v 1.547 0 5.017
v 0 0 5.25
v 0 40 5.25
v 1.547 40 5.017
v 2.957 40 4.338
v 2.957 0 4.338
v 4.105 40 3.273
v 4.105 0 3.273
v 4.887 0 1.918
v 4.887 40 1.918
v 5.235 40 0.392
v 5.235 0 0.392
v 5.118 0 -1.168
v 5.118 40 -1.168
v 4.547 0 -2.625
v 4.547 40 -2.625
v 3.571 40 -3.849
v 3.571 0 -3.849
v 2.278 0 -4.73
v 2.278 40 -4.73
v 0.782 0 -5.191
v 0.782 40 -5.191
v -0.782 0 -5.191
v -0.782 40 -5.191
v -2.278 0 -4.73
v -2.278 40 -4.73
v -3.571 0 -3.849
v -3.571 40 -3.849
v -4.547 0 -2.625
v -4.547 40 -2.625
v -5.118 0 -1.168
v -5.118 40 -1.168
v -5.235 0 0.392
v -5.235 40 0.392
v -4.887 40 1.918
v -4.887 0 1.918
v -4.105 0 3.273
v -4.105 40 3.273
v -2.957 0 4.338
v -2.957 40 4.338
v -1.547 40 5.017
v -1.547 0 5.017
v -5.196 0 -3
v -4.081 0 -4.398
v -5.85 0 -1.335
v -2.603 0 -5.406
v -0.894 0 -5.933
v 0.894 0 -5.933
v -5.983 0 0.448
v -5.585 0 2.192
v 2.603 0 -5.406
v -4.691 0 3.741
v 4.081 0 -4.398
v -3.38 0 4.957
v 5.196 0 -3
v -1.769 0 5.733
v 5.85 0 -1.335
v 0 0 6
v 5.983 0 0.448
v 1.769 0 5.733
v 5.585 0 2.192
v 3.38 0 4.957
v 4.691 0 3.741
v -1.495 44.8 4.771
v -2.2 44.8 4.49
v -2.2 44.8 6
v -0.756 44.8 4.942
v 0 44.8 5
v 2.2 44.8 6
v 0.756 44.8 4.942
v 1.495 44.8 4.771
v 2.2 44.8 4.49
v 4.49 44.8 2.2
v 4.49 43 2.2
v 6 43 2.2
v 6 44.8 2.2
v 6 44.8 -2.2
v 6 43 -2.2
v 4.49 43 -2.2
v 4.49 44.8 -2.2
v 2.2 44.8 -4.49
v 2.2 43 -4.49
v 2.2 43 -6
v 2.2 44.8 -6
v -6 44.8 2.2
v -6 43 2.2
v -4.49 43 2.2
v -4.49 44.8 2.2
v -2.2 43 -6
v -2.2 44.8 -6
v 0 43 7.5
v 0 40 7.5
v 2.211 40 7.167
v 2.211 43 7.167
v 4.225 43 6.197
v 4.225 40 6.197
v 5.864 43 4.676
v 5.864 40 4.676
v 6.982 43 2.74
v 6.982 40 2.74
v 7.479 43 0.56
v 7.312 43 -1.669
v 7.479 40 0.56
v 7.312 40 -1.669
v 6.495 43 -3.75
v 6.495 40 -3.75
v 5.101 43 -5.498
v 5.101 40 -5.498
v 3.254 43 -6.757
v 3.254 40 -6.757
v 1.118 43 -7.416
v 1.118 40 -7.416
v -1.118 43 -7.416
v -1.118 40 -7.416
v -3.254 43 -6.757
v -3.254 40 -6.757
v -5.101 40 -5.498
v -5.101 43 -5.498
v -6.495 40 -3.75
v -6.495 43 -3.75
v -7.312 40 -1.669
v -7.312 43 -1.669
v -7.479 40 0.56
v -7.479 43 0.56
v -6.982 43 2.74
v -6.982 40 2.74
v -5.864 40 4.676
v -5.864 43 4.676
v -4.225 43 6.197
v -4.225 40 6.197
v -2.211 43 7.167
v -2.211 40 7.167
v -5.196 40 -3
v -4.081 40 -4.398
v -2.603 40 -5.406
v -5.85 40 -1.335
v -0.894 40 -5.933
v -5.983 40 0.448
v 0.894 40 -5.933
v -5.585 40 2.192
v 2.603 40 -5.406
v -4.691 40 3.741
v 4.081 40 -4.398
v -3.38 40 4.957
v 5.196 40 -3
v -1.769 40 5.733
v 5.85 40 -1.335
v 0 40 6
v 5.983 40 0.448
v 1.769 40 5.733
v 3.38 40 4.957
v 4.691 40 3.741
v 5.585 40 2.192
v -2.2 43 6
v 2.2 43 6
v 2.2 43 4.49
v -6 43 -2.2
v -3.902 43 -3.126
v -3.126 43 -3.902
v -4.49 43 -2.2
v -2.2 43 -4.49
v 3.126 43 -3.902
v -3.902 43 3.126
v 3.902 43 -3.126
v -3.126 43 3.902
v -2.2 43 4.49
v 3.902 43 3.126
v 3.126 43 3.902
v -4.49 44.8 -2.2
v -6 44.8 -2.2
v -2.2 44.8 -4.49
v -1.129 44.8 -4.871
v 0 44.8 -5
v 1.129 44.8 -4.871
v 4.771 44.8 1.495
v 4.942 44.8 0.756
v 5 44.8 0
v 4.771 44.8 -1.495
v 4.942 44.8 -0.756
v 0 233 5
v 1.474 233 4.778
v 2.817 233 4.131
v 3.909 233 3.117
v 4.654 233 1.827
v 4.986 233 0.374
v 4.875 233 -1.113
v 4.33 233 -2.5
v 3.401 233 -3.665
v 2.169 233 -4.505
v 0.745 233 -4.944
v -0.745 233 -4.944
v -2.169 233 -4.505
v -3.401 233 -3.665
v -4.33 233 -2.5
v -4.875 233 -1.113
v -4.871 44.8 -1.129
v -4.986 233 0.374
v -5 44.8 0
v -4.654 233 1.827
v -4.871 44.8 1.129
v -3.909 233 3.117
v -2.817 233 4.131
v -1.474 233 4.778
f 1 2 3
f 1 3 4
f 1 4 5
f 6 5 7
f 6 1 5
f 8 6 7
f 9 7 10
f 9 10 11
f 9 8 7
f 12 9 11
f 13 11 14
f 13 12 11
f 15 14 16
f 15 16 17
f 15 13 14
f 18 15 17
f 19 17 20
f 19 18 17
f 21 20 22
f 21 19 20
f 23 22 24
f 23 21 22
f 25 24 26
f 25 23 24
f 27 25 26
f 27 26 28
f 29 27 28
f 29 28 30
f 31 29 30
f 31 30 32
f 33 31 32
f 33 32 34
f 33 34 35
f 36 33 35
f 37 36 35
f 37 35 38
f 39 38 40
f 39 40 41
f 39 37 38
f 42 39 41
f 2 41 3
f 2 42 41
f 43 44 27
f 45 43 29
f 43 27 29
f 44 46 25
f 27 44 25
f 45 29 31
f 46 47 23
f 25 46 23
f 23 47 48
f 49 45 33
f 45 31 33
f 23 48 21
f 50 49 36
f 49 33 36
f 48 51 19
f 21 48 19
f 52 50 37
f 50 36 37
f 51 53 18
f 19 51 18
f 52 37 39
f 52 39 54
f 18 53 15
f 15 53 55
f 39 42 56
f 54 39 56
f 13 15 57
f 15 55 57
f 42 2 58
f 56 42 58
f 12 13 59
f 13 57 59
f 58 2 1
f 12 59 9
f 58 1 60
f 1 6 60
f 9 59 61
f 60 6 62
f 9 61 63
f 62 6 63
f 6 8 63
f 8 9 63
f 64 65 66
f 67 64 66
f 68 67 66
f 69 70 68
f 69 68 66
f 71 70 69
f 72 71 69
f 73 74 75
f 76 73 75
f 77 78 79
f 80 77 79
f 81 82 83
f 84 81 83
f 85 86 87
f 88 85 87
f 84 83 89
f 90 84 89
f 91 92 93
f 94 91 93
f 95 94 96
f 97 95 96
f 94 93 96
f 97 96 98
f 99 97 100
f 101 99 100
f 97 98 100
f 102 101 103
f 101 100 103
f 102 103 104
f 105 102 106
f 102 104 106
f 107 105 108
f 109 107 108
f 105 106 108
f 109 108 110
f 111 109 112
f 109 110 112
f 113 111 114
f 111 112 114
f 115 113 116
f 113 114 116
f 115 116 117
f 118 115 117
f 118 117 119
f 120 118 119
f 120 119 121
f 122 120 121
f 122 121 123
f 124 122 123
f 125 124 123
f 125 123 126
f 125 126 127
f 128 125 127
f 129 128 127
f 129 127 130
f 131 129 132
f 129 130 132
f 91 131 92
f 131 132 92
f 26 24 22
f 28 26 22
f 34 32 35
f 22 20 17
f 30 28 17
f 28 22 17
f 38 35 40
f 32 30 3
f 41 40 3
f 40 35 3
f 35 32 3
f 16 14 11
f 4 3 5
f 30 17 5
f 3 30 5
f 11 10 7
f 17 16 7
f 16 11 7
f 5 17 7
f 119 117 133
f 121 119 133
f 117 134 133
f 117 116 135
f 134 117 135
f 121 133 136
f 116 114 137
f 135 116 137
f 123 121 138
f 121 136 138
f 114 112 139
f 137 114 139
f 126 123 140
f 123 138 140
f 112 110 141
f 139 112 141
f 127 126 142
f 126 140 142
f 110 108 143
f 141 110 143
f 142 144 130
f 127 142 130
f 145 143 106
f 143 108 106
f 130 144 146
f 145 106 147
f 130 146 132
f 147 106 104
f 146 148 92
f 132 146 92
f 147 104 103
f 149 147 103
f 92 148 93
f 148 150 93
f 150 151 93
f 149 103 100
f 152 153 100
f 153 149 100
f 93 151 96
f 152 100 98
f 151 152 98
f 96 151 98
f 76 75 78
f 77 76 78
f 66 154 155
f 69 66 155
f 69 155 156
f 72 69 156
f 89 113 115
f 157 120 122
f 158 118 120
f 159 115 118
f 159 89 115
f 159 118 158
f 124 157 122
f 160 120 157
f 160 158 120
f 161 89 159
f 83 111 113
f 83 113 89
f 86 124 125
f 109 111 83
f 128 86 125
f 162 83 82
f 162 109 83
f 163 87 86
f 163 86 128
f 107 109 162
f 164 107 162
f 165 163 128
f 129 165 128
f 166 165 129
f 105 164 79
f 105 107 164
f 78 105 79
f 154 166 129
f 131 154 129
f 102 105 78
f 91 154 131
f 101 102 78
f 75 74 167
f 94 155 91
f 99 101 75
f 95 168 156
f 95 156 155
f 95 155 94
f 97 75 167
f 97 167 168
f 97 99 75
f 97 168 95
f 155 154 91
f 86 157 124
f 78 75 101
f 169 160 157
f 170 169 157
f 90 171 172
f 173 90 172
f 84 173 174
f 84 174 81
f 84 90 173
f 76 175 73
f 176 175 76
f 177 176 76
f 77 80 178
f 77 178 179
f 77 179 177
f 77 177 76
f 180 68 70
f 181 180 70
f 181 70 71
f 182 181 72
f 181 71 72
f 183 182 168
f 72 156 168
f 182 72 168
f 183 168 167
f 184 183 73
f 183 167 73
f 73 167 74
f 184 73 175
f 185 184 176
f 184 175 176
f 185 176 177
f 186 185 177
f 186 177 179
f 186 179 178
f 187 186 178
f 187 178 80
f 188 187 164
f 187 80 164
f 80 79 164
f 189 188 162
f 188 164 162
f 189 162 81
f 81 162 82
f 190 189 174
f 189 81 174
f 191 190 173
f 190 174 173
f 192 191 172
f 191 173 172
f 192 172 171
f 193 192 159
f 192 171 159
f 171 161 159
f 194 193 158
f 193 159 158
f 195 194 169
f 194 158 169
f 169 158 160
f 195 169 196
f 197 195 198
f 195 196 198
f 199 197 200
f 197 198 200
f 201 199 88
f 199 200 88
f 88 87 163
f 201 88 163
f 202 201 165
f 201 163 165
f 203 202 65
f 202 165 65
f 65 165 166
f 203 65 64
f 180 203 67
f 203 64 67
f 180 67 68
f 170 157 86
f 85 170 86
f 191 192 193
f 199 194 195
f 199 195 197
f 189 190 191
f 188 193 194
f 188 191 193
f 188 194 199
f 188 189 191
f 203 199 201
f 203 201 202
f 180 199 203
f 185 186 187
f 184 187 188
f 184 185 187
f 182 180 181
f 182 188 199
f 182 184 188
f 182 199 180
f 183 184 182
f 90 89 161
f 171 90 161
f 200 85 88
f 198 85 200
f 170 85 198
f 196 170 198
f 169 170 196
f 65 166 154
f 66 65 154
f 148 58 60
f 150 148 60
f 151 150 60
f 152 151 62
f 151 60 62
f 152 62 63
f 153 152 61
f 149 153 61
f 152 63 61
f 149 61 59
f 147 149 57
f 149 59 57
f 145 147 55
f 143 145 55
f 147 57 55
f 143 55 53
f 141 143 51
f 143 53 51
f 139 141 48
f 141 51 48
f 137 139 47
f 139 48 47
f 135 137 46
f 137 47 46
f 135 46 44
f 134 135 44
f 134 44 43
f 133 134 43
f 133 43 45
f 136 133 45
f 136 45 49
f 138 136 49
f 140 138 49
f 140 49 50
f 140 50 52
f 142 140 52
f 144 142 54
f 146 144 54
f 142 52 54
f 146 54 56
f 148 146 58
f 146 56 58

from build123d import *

# Parameters (mm, degrees)
SKETCH_1_R      = 6
SKETCH_1_R_2    = 5.25
EXTRUDE_2_DEPTH = 40
SKETCH_2_R      = 7.5
EXTRUDE_3_DEPTH = 3
SKETCH_3_R      = 5
EXTRUDE_4_DEPTH = 190
EXTRUDE_6_DEPTH = 1.8


with BuildPart() as part:
    # 草图1 → 凸台-拉伸2 (new body)
    with BuildSketch(Plane(origin=(0, 0, 0), x_dir=(1, 0, 0), z_dir=(0, 1, 0))):
        with Locations(Location((0, 0, 0), (0, 0, 270))):
            Circle(SKETCH_1_R)
        with Locations(Location((0, 0, 0), (0, 0, 270))):
            Circle(SKETCH_1_R_2, mode=Mode.SUBTRACT)
    extrude(amount=EXTRUDE_2_DEPTH)

    # 草图2 → 凸台-拉伸3 (add)
    with BuildSketch(Plane(origin=(0, 40, 0), x_dir=(1, 0, 0), z_dir=(0, 1, 0))):
        with Locations(Location((0, 0, 0), (0, 0, 270))):
            Circle(SKETCH_2_R)
    extrude(amount=EXTRUDE_3_DEPTH)

    # 草图3 → 凸台-拉伸4 (add)
    with BuildSketch(Plane(origin=(0, 43, 0), x_dir=(1, 0, 0), z_dir=(0, 1, 0))):
        with Locations(Location((0, 0, 0), (0, 0, 270))):
            Circle(SKETCH_3_R)
    extrude(amount=EXTRUDE_4_DEPTH)

    # 草图4 → 凸台-拉伸6 (add)
    with BuildSketch(Plane(origin=(0, 43, 0), x_dir=(1, 0, 0), z_dir=(0, 1, 0))):
        with BuildLine():
            Line((6, 2.2), (4.489988864, 2.2))
            ThreePointArc((4.489988864, 2.2), (4.870828693, 1.129171307), (5, 0))
            ThreePointArc((5, 0), (4.870828693, -1.129171307), (4.489988864, -2.2))
            Line((4.489988864, -2.2), (6, -2.2))
            Line((6, -2.2), (6, 2.2))
        make_face()
        with BuildLine():
            ThreePointArc((2.2, -4.489988864), (0, -5), (-2.2, -4.489988864))
            Line((-2.2, -4.489988864), (-2.2, -6))
            Line((-2.2, -6), (2.2, -6))
            Line((2.2, -6), (2.2, -4.489988864))
        make_face()
        with BuildLine():
            Line((-2.2, 6), (-2.2, 4.489988864))
            ThreePointArc((-2.2, 4.489988864), (0, 5), (2.2, 4.489988864))
            Line((2.2, 4.489988864), (2.2, 6))
            Line((2.2, 6), (-2.2, 6))
        make_face()
        with BuildLine():
            ThreePointArc((-4.489988864, -2.2), (-5, 0), (-4.489988864, 2.2))
            Line((-4.489988864, 2.2), (-6, 2.2))
            Line((-6, 2.2), (-6, -2.2))
            Line((-6, -2.2), (-4.489988864, -2.2))
        make_face()
    extrude(amount=EXTRUDE_6_DEPTH)


solid = part.part
